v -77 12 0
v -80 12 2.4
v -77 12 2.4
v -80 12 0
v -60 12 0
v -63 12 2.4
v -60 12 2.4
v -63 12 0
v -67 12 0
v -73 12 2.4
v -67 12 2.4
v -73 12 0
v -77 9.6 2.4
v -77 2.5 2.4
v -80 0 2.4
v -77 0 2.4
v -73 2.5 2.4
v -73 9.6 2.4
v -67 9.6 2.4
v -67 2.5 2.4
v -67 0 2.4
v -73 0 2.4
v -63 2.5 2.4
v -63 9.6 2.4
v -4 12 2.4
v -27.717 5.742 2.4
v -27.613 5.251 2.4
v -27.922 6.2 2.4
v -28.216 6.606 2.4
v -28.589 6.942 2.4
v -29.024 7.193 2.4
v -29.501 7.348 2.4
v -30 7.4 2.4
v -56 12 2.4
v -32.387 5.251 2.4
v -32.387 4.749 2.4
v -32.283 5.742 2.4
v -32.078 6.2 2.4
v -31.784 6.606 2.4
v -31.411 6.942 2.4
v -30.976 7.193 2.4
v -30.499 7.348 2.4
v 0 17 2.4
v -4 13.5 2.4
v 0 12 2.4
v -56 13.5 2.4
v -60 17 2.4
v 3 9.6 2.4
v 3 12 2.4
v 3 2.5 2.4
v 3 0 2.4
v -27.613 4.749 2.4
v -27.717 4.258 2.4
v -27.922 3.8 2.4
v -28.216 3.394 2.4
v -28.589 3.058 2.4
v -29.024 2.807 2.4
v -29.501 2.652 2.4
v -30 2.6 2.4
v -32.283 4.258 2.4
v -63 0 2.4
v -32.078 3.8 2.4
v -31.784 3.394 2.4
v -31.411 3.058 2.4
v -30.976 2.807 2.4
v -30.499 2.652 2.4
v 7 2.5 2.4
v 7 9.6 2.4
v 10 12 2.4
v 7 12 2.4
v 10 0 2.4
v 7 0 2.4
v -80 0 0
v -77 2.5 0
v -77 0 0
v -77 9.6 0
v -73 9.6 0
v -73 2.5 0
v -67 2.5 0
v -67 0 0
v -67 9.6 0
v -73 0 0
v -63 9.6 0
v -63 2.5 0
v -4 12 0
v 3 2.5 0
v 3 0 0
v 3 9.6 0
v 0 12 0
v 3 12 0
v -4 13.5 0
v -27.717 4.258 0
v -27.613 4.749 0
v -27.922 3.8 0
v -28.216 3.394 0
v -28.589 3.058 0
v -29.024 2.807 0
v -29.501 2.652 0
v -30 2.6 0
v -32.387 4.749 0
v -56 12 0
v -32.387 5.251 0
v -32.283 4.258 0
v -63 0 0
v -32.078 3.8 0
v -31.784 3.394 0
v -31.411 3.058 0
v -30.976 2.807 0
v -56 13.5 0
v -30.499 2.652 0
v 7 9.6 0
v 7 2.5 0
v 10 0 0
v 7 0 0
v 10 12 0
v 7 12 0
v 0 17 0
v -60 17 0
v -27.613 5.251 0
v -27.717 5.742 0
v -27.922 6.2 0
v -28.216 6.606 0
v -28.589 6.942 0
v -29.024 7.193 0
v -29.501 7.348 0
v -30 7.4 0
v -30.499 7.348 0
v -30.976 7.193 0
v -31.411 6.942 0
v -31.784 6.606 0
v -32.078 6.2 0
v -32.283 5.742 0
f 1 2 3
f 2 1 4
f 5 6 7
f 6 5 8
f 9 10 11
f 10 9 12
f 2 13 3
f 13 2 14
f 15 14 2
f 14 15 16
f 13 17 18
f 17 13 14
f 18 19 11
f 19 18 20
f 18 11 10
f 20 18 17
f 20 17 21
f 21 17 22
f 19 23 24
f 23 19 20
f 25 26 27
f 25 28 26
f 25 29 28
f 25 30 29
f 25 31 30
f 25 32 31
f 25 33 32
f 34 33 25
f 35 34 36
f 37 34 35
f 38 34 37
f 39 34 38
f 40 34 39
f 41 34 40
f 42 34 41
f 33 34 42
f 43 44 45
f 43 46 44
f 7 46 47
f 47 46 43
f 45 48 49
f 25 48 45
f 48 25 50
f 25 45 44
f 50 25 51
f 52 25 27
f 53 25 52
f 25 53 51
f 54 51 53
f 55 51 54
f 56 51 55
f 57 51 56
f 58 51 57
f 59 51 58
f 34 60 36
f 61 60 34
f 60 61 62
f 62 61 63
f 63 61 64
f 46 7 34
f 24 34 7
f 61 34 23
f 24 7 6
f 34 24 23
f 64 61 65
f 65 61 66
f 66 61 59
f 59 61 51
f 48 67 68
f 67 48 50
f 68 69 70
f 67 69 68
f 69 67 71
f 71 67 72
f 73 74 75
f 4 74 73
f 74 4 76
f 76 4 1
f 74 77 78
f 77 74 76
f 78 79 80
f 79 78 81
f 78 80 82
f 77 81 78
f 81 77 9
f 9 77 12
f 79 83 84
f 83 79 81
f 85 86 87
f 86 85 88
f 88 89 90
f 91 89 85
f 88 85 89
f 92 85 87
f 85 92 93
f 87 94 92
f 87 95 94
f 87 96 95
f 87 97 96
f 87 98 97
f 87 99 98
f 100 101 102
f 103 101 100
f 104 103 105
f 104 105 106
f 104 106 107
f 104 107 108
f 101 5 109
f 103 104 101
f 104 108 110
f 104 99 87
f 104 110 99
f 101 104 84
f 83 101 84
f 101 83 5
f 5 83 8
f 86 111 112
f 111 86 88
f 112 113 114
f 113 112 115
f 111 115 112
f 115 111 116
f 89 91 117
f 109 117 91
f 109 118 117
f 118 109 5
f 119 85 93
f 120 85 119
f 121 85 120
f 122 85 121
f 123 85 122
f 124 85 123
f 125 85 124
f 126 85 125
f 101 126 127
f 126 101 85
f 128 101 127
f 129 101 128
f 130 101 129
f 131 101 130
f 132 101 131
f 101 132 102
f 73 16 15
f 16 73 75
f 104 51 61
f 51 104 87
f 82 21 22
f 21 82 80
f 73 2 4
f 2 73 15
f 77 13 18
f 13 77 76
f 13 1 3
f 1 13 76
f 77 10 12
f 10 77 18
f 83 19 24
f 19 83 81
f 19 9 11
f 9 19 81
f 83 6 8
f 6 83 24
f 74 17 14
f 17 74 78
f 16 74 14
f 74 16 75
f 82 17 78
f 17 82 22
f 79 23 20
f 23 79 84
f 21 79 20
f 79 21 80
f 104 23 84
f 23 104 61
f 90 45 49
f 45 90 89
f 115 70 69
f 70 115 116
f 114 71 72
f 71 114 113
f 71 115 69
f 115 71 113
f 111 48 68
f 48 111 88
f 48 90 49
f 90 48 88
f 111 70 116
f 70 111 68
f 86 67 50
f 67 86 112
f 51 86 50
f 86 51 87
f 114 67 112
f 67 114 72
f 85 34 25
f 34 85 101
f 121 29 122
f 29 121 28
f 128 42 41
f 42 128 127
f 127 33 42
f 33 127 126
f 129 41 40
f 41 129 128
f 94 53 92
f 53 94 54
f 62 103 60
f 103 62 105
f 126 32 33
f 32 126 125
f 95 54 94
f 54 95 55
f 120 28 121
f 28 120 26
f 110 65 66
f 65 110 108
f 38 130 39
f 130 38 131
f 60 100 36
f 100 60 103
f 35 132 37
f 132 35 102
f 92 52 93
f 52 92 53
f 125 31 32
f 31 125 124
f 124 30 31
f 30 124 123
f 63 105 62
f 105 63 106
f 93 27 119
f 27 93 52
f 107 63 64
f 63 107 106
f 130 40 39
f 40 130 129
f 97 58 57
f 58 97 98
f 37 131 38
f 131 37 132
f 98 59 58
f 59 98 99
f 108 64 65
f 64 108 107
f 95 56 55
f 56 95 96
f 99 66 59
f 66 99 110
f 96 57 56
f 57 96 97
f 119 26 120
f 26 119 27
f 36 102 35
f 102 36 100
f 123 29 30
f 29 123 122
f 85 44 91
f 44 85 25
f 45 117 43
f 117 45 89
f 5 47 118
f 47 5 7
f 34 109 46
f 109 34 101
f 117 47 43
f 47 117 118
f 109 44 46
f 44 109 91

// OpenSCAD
module mount()
{

translate(v=[0,60,0])
  difference()
  {
    cube(size=[12,20,2.4]);

    translate(v=[9.6,13,0])
      cube(size=[2.5,4,2.4]);

    translate(v=[9.6,3,0])
      cube(size=[2.5,4,2.4]);

    translate(v=[0,13,0])
      cube(size=[2.5,4,2.4]);

    translate(v=[0,3,0])
      cube(size=[2.5,4,2.4]);

  }

translate(v=[0,-10,0])
  difference()
  {
    cube(size=[12,10,2.4]);

    translate(v=[9.6,3,0])
      cube(size=[2.5,4,2.4]);

    translate(v=[0,3,0])
      cube(size=[2.5,4,2.4]);
  }

difference()
{
  cube(size=[12,60,2.4]);

  translate(v=[5,30,1.2])
    cylinder(h=2.4,r=2.4,$fs=0.1,center=true);
}

translate(v=[12,0,0])
  cube(size=[2.4,4,2.4]);

translate(v=[12,56,0])
  cube(size=[2.4,4,2.4]);

translate(v=[13.5,0,0])
  cube(size=[3.5,60,2.4]);
}

rotate([0,0,90])
  mount();
